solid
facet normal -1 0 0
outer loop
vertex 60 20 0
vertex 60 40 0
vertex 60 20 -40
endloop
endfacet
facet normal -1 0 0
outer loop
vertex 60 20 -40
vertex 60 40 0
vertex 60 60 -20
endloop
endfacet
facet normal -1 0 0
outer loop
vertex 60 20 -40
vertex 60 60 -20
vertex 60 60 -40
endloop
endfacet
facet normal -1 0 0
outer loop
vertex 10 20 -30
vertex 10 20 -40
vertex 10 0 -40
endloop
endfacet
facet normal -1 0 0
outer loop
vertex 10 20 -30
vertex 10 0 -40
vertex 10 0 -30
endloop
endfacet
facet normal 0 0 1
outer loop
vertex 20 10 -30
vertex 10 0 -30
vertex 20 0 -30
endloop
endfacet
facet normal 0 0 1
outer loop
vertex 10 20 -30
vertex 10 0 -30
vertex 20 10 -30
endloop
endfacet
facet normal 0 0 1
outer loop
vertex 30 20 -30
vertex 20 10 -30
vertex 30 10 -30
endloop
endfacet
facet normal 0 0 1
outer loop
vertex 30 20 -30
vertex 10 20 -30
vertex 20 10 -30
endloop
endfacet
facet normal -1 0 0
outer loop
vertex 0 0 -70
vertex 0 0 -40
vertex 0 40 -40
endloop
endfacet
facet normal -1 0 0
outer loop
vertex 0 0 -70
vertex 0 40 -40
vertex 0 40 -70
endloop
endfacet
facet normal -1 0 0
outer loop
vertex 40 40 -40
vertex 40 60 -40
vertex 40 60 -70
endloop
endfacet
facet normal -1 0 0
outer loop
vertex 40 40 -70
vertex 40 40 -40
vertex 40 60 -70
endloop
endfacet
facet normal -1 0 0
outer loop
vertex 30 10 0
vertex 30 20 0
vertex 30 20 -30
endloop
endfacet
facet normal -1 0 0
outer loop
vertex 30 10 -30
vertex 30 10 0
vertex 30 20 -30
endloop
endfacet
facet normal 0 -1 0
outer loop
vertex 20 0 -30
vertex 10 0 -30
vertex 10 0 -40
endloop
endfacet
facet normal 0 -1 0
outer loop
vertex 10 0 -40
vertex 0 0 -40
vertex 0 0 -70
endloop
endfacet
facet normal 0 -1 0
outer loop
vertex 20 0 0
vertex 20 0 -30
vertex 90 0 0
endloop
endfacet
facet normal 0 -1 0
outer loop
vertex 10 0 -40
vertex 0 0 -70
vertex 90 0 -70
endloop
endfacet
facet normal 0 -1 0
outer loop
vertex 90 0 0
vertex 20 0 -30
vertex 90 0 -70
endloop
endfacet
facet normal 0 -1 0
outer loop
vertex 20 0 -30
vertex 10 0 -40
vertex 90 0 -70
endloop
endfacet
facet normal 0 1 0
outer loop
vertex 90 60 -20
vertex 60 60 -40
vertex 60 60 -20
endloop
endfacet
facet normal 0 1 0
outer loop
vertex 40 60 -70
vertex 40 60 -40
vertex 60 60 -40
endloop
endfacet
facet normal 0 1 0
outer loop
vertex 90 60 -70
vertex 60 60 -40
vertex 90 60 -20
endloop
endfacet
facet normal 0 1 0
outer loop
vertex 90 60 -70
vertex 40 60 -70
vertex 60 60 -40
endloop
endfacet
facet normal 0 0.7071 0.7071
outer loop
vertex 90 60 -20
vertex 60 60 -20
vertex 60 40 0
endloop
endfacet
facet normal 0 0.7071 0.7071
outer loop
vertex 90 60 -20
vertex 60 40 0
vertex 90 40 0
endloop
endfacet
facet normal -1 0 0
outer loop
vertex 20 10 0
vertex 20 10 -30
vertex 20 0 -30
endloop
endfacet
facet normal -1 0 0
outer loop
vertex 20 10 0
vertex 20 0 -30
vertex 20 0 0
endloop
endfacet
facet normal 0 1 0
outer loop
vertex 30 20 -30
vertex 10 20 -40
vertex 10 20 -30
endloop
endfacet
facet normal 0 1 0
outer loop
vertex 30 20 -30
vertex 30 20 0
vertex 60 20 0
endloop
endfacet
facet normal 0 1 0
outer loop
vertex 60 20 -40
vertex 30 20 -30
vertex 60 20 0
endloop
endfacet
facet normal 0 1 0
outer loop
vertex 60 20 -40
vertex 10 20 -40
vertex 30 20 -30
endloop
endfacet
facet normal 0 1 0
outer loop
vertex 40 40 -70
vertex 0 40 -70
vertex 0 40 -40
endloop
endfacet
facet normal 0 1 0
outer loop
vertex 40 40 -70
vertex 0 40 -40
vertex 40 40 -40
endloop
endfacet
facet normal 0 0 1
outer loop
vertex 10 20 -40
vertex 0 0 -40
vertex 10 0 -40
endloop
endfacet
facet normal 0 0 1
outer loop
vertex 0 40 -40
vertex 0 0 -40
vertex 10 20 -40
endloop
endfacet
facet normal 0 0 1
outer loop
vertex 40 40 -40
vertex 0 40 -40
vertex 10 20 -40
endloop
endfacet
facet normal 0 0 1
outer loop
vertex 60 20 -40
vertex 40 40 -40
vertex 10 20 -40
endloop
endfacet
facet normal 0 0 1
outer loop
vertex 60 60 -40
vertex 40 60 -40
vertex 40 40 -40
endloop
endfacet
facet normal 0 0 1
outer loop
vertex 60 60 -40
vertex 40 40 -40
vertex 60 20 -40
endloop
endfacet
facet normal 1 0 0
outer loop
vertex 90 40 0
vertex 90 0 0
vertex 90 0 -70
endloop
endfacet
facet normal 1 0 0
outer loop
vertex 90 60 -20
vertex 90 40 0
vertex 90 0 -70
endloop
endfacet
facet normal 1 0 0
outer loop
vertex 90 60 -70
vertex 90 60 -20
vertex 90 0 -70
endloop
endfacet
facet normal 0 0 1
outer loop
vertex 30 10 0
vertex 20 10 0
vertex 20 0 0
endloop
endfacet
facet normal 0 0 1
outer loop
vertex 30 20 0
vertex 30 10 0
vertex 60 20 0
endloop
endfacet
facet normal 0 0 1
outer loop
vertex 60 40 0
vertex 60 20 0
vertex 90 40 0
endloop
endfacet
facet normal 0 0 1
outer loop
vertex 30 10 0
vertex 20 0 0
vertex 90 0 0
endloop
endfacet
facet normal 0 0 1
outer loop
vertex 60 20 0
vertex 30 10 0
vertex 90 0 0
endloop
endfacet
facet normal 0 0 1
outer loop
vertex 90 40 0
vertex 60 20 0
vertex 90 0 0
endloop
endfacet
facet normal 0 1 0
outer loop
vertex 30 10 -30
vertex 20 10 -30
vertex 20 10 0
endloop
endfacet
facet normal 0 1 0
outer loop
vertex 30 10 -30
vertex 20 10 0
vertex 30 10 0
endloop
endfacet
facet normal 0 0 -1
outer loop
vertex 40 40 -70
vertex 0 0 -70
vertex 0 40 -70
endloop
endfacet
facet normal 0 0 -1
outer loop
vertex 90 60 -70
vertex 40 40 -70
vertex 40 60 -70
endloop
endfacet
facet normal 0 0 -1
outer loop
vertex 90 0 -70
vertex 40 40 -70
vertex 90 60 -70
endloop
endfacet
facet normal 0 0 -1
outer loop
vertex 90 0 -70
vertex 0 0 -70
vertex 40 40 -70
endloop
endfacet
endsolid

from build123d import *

# Parameters (mm, degrees)
SKETCH1_W           = 90
SKETCH1_H           = 70
BOSS_EXTRUDE1_DEPTH = 60
SKETCH2_W           = 60
SKETCH2_H           = 40
CUT_EXTRUDE1_DEPTH  = 40
SKETCH3_W           = 30
SKETCH3_H           = 30
CUT_EXTRUDE2_DEPTH  = 10
SKETCH4_W           = 30
SKETCH4_H           = 10
CUT_EXTRUDE3_DEPTH  = 20
SKETCH5_W           = 10
SKETCH5_H           = 20
CUT_EXTRUDE4_DEPTH  = 10
SKETCH7_W           = 40
SKETCH7_H           = 30
CUT_EXTRUDE5_DEPTH  = 20
CHAMFER1_SIZE       = 20


with BuildPart() as part:
    # Sketch1 → Boss-Extrude1 (new body)
    with BuildSketch(Plane(origin=(0, 0, 0), x_dir=(1, 0, 0), z_dir=(0, 1, 0))):
        with Locations((45, 35)):
            Rectangle(SKETCH1_W, SKETCH1_H)
    extrude(amount=BOSS_EXTRUDE1_DEPTH)

    # Sketch2 → Cut-Extrude1 (cut)
    with BuildSketch(Plane(origin=(0, 60, 0), x_dir=(1, 0, 0), z_dir=(0, 1, 0))):
        with Locations((30, 20)):
            Rectangle(SKETCH2_W, SKETCH2_H)
    extrude(amount=-CUT_EXTRUDE1_DEPTH, mode=Mode.SUBTRACT)

    # Sketch3 → Cut-Extrude2 (cut)
    with BuildSketch(Plane(origin=(0, 20, 0), x_dir=(1, 0, 0), z_dir=(0, 1, 0))):
        with Locations((15, 15)):
            Rectangle(SKETCH3_W, SKETCH3_H)
    extrude(amount=-CUT_EXTRUDE2_DEPTH, mode=Mode.SUBTRACT)

    # Sketch4 → Cut-Extrude3 (cut)
    with BuildSketch(Plane.ZY):
        with Locations((-15, 5)):
            Rectangle(SKETCH4_W, SKETCH4_H)
    extrude(amount=-CUT_EXTRUDE3_DEPTH, mode=Mode.SUBTRACT)

    # Sketch5 → Cut-Extrude4 (cut)
    with BuildSketch(Plane.ZY):
        with Locations((-35, 10)):
            Rectangle(SKETCH5_W, SKETCH5_H)
    extrude(amount=-CUT_EXTRUDE4_DEPTH, mode=Mode.SUBTRACT)

    # Sketch7 → Cut-Extrude5 (cut)
    with BuildSketch(Plane(origin=(0, 60, 0), x_dir=(1, 0, 0), z_dir=(0, 1, 0))):
        with Locations((20, 55)):
            Rectangle(SKETCH7_W, SKETCH7_H)
    extrude(amount=-CUT_EXTRUDE5_DEPTH, mode=Mode.SUBTRACT)

    # Chamfer1
    chamfer1_edges = [part.edges().sort_by_distance(p)[0] for p in [
        (75, 60, 0),
    ]]
    chamfer(chamfer1_edges, length=CHAMFER1_SIZE)


solid = part.part
